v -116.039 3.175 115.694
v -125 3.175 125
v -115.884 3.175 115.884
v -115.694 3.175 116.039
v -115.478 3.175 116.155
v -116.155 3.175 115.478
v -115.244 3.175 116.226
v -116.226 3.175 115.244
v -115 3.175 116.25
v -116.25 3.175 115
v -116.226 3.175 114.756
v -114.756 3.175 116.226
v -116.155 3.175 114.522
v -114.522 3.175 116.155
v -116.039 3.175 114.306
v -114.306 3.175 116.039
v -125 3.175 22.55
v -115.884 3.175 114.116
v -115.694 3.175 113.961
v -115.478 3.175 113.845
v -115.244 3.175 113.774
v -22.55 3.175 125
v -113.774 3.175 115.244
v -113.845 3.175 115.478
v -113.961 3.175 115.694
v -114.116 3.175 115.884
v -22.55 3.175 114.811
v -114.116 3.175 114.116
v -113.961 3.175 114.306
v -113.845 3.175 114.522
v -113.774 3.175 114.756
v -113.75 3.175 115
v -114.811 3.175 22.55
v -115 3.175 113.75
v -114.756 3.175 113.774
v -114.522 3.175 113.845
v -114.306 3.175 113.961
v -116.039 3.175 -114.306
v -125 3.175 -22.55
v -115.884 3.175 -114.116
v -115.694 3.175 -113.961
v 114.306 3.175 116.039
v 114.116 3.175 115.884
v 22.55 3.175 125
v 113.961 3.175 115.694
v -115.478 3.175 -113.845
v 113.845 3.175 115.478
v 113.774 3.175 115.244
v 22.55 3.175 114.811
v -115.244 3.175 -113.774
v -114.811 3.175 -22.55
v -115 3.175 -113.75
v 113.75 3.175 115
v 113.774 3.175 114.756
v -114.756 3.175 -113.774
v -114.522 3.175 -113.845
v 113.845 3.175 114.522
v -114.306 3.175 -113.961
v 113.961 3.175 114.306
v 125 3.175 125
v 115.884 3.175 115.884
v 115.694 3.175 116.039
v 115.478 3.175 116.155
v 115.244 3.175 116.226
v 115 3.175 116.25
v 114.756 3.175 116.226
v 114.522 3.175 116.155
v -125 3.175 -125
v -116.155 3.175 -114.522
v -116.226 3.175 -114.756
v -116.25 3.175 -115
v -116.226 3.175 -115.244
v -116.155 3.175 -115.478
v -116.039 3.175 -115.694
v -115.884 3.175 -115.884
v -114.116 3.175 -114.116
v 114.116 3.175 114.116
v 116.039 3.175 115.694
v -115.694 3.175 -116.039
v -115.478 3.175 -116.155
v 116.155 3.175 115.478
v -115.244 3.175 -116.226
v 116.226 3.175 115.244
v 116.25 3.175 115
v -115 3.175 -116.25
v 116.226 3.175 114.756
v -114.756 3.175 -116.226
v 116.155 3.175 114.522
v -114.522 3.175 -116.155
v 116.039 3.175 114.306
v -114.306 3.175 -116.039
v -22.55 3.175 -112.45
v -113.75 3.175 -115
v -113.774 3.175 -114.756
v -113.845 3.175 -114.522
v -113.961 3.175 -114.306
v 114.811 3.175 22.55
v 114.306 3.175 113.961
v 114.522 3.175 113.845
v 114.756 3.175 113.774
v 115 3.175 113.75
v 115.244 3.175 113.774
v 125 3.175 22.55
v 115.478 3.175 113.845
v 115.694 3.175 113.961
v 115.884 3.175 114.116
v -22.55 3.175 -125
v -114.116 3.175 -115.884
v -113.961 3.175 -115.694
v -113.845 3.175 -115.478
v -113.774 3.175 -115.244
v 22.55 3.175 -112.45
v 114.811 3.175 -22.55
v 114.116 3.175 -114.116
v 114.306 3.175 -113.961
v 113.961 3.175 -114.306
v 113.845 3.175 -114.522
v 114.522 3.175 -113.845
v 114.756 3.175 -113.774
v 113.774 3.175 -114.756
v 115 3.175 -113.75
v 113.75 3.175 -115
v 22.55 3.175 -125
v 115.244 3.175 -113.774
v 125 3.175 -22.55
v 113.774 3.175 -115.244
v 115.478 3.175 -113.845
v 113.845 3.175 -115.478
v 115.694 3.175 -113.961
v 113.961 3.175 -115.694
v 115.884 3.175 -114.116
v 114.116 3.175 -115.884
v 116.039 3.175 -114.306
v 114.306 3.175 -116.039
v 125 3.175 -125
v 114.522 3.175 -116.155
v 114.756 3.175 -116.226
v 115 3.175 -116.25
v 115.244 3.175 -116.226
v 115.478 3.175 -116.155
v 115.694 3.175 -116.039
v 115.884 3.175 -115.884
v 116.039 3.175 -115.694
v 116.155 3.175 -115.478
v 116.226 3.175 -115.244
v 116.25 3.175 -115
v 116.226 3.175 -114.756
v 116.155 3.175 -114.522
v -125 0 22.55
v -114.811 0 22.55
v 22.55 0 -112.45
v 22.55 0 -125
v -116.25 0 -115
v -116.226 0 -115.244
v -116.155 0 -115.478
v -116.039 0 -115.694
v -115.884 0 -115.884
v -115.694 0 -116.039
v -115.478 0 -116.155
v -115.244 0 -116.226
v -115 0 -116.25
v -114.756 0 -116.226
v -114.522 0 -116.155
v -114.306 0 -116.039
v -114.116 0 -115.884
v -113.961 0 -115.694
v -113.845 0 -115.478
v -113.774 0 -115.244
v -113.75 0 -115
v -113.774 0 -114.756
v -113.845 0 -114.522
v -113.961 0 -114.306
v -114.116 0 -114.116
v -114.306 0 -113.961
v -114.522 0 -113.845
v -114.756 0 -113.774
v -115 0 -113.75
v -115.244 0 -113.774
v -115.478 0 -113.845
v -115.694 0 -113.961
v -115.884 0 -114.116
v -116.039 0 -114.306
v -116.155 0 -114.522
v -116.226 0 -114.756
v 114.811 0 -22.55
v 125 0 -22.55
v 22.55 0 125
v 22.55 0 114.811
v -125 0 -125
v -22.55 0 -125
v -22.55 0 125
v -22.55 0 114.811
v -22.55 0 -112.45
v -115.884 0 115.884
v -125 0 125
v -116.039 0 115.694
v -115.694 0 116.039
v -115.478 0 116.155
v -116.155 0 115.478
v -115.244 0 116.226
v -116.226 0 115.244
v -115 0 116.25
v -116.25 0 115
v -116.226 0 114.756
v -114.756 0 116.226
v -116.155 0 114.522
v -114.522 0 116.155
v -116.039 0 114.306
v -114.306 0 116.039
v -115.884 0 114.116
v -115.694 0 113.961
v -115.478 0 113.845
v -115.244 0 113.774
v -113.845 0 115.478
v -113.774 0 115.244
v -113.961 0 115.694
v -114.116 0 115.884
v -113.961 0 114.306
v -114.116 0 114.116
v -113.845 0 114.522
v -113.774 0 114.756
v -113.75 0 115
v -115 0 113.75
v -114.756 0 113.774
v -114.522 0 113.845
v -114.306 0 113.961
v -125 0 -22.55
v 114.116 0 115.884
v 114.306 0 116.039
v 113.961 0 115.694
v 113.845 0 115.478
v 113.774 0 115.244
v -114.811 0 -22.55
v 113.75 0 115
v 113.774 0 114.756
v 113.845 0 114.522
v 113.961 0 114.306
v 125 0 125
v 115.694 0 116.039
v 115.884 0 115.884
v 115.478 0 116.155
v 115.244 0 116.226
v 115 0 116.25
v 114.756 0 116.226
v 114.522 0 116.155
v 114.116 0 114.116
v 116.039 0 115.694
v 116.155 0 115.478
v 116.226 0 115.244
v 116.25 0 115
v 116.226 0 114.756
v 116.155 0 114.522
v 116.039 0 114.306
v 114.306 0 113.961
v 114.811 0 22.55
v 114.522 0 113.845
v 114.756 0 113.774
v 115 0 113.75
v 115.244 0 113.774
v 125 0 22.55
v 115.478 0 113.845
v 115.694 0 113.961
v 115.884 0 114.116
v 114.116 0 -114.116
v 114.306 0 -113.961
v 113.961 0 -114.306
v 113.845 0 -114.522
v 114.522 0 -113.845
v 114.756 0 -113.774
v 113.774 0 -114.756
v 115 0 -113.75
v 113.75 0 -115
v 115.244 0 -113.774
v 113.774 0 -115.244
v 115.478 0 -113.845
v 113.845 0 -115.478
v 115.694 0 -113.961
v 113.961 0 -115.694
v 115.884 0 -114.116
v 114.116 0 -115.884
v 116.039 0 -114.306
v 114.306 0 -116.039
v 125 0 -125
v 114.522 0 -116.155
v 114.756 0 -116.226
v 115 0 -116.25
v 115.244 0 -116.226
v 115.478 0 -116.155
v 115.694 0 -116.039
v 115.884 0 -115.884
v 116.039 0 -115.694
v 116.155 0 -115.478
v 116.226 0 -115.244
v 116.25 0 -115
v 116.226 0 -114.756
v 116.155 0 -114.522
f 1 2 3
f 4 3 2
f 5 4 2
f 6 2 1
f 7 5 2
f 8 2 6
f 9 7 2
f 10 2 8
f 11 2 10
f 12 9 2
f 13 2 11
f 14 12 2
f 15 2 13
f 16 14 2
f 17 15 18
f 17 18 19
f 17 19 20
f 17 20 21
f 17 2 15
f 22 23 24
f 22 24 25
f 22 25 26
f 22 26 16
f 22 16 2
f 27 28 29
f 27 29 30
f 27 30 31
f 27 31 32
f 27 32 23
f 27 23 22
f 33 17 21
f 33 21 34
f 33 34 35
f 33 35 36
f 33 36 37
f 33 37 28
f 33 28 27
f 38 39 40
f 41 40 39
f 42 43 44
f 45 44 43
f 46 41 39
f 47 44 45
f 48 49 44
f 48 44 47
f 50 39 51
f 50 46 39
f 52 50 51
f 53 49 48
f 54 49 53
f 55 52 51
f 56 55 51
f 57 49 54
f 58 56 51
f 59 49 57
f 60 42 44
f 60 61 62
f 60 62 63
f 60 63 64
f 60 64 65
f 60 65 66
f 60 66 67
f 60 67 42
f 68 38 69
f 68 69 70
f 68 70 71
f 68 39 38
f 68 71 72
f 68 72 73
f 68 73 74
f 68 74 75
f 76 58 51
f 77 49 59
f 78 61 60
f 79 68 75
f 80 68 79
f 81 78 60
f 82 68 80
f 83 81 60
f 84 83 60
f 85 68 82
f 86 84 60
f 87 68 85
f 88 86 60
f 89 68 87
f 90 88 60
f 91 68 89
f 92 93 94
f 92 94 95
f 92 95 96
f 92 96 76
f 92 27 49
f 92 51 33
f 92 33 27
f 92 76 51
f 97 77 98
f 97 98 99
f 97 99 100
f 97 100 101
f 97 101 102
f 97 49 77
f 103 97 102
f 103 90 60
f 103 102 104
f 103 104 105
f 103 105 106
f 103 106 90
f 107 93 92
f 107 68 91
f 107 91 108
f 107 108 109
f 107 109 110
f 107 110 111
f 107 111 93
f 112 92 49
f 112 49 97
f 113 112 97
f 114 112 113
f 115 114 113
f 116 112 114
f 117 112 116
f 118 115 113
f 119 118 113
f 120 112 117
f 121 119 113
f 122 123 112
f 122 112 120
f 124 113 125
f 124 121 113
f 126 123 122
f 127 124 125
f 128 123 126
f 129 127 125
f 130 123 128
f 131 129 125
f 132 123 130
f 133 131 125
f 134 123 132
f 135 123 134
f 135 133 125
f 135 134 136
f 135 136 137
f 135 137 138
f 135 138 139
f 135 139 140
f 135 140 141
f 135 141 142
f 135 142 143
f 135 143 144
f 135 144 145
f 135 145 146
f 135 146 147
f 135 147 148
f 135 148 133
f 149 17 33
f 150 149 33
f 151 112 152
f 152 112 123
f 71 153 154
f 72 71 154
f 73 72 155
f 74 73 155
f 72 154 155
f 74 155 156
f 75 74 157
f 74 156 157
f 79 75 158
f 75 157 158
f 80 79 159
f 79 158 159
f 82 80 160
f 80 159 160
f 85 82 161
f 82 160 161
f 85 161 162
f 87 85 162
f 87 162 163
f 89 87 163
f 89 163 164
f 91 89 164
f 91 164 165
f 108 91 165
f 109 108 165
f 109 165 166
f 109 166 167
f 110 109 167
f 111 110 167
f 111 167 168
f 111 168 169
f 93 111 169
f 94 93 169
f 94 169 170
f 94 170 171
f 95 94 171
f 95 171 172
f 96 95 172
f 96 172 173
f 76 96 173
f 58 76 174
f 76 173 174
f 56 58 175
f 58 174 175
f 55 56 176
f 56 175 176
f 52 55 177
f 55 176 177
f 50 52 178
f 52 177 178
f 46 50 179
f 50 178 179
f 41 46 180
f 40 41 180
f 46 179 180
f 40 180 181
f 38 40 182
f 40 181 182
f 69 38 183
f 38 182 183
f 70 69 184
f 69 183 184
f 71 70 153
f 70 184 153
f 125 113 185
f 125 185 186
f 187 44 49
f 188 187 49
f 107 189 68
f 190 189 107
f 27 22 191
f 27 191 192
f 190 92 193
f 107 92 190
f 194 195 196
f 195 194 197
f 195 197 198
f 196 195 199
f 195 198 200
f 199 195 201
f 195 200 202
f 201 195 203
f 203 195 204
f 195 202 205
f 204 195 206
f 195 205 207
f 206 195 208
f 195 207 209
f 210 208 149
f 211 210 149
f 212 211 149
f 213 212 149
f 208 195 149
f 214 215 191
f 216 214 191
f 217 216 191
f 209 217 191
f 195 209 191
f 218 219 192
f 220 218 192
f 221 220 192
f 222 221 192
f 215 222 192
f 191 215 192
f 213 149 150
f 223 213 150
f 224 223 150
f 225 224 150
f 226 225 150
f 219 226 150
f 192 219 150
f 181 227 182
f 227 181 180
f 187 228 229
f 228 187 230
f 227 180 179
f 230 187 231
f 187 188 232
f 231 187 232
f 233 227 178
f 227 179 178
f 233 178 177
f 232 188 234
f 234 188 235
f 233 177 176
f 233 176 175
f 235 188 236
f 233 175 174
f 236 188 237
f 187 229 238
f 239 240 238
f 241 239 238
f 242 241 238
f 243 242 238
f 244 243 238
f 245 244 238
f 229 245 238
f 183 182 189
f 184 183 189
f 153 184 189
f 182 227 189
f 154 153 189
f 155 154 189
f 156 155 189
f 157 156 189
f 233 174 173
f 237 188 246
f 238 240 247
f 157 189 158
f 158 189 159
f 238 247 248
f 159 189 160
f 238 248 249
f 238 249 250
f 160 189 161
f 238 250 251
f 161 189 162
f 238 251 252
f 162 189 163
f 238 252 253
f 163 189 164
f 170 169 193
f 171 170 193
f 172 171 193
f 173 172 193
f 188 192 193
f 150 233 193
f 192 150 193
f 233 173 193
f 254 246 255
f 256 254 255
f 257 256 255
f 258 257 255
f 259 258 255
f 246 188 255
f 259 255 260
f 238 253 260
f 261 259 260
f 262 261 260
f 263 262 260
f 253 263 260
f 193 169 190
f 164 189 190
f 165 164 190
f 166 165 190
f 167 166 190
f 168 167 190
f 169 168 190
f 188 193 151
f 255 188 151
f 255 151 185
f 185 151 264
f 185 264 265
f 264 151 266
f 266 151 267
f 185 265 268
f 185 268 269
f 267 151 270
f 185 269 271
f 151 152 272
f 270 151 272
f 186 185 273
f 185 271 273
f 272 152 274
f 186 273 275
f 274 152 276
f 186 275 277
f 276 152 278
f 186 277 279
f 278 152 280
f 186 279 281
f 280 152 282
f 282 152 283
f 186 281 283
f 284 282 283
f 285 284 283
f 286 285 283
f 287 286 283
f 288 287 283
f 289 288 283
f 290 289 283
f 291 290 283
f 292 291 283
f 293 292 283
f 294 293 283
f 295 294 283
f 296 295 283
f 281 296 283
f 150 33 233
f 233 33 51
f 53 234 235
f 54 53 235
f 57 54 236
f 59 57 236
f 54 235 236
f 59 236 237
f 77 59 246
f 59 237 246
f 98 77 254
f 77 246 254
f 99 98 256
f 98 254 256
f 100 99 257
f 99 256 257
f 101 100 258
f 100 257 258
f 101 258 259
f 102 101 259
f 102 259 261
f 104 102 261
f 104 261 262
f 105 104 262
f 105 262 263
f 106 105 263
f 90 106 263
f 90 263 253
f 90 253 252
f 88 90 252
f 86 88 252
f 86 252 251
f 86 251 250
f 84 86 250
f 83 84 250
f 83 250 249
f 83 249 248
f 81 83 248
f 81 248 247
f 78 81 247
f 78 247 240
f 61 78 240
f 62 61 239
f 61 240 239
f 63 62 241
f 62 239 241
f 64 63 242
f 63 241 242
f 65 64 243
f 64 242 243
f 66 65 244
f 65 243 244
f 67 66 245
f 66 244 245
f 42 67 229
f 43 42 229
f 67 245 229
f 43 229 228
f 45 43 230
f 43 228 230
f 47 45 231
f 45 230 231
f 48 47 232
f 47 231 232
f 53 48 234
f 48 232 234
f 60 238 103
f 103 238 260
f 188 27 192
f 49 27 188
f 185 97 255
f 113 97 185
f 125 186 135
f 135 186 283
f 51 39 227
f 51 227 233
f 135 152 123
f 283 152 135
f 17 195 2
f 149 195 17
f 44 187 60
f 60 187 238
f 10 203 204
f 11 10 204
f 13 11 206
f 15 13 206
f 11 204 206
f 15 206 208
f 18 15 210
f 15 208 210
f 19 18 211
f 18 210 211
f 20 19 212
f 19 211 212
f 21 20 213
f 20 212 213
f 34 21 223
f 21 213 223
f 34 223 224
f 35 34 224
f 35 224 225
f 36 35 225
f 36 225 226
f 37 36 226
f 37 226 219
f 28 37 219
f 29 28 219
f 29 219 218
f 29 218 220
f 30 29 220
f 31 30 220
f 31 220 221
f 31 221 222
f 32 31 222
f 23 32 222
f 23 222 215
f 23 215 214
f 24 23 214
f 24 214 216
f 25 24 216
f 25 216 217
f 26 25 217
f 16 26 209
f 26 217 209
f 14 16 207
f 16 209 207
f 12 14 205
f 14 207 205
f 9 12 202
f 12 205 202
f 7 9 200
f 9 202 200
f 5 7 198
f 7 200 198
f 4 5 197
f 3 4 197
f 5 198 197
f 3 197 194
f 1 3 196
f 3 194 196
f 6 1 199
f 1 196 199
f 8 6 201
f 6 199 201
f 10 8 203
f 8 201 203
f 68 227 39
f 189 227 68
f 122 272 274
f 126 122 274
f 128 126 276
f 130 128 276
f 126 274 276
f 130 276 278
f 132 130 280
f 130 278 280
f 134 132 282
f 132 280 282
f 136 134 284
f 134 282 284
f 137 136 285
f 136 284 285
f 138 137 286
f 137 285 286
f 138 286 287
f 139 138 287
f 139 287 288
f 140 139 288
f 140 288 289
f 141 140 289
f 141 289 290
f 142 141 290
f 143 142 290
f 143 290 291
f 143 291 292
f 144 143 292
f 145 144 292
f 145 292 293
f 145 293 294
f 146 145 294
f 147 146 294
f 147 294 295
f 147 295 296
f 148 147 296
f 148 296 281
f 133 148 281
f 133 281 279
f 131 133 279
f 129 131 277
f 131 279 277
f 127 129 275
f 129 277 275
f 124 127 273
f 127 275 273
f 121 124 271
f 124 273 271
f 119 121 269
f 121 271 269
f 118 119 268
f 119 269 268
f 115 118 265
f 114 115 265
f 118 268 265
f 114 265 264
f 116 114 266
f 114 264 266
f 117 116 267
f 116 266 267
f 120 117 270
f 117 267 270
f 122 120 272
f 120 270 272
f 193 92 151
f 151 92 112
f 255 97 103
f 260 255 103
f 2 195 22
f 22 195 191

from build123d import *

# Parameters (mm, degrees)
SKETCH2_W          = 250
SKETCH2_H          = 250
BASE_DEPTH         = 3.175
SKETCH4_W          = 45.1
SKETCH4_H          = 25.1
SKETCH4_W_2        = 20.378913316
SKETCH4_H_2        = 45.1
SKETCH4_H_3        = 20.378913316
JIGSAW_DEPTH       = 10
STANDOFF_HOLES_D   = 2.5
STANDOFF_HOLES_2_D = 2.5


with BuildPart() as part:
    # Sketch2 → Base (new body)
    with BuildSketch(Plane(origin=(0, 0, 0), x_dir=(1, 0, 0), z_dir=(0, 1, 0))):
        Rectangle(SKETCH2_W, SKETCH2_H)
    extrude(amount=BASE_DEPTH)

    # Sketch4 → Jigsaw (cut)
    with BuildSketch(Plane(origin=(0, 3.175, 0), x_dir=(1, 0, 0), z_dir=(0, 1, 0))):
        with Locations((0, 125)):
            Rectangle(SKETCH4_W, SKETCH4_H)
        with Locations((-125, 0)):
            Rectangle(SKETCH4_W_2, SKETCH4_H_2)
        with Locations((125, 0)):
            Rectangle(SKETCH4_W_2, SKETCH4_H_2)
        with Locations((0, -125)):
            Rectangle(SKETCH4_W, SKETCH4_H_3)
    extrude(amount=-JIGSAW_DEPTH, mode=Mode.SUBTRACT)

    # Standoff Holes (through all)
    with Locations(Plane(origin=(0, 3.175, 0), x_dir=(1, 0, 0), z_dir=(0, 1, 0))):
        with Locations((-115, 115)):
            Hole(STANDOFF_HOLES_D / 2)

    # Standoff Holes 2 (through all)
    with Locations(Plane(origin=(0, 3.175, 0), x_dir=(1, 0, 0), z_dir=(0, 1, 0))):
        with Locations((115, 115), (115, -115), (-115, -115)):
            Hole(STANDOFF_HOLES_2_D / 2)


solid = part.part
